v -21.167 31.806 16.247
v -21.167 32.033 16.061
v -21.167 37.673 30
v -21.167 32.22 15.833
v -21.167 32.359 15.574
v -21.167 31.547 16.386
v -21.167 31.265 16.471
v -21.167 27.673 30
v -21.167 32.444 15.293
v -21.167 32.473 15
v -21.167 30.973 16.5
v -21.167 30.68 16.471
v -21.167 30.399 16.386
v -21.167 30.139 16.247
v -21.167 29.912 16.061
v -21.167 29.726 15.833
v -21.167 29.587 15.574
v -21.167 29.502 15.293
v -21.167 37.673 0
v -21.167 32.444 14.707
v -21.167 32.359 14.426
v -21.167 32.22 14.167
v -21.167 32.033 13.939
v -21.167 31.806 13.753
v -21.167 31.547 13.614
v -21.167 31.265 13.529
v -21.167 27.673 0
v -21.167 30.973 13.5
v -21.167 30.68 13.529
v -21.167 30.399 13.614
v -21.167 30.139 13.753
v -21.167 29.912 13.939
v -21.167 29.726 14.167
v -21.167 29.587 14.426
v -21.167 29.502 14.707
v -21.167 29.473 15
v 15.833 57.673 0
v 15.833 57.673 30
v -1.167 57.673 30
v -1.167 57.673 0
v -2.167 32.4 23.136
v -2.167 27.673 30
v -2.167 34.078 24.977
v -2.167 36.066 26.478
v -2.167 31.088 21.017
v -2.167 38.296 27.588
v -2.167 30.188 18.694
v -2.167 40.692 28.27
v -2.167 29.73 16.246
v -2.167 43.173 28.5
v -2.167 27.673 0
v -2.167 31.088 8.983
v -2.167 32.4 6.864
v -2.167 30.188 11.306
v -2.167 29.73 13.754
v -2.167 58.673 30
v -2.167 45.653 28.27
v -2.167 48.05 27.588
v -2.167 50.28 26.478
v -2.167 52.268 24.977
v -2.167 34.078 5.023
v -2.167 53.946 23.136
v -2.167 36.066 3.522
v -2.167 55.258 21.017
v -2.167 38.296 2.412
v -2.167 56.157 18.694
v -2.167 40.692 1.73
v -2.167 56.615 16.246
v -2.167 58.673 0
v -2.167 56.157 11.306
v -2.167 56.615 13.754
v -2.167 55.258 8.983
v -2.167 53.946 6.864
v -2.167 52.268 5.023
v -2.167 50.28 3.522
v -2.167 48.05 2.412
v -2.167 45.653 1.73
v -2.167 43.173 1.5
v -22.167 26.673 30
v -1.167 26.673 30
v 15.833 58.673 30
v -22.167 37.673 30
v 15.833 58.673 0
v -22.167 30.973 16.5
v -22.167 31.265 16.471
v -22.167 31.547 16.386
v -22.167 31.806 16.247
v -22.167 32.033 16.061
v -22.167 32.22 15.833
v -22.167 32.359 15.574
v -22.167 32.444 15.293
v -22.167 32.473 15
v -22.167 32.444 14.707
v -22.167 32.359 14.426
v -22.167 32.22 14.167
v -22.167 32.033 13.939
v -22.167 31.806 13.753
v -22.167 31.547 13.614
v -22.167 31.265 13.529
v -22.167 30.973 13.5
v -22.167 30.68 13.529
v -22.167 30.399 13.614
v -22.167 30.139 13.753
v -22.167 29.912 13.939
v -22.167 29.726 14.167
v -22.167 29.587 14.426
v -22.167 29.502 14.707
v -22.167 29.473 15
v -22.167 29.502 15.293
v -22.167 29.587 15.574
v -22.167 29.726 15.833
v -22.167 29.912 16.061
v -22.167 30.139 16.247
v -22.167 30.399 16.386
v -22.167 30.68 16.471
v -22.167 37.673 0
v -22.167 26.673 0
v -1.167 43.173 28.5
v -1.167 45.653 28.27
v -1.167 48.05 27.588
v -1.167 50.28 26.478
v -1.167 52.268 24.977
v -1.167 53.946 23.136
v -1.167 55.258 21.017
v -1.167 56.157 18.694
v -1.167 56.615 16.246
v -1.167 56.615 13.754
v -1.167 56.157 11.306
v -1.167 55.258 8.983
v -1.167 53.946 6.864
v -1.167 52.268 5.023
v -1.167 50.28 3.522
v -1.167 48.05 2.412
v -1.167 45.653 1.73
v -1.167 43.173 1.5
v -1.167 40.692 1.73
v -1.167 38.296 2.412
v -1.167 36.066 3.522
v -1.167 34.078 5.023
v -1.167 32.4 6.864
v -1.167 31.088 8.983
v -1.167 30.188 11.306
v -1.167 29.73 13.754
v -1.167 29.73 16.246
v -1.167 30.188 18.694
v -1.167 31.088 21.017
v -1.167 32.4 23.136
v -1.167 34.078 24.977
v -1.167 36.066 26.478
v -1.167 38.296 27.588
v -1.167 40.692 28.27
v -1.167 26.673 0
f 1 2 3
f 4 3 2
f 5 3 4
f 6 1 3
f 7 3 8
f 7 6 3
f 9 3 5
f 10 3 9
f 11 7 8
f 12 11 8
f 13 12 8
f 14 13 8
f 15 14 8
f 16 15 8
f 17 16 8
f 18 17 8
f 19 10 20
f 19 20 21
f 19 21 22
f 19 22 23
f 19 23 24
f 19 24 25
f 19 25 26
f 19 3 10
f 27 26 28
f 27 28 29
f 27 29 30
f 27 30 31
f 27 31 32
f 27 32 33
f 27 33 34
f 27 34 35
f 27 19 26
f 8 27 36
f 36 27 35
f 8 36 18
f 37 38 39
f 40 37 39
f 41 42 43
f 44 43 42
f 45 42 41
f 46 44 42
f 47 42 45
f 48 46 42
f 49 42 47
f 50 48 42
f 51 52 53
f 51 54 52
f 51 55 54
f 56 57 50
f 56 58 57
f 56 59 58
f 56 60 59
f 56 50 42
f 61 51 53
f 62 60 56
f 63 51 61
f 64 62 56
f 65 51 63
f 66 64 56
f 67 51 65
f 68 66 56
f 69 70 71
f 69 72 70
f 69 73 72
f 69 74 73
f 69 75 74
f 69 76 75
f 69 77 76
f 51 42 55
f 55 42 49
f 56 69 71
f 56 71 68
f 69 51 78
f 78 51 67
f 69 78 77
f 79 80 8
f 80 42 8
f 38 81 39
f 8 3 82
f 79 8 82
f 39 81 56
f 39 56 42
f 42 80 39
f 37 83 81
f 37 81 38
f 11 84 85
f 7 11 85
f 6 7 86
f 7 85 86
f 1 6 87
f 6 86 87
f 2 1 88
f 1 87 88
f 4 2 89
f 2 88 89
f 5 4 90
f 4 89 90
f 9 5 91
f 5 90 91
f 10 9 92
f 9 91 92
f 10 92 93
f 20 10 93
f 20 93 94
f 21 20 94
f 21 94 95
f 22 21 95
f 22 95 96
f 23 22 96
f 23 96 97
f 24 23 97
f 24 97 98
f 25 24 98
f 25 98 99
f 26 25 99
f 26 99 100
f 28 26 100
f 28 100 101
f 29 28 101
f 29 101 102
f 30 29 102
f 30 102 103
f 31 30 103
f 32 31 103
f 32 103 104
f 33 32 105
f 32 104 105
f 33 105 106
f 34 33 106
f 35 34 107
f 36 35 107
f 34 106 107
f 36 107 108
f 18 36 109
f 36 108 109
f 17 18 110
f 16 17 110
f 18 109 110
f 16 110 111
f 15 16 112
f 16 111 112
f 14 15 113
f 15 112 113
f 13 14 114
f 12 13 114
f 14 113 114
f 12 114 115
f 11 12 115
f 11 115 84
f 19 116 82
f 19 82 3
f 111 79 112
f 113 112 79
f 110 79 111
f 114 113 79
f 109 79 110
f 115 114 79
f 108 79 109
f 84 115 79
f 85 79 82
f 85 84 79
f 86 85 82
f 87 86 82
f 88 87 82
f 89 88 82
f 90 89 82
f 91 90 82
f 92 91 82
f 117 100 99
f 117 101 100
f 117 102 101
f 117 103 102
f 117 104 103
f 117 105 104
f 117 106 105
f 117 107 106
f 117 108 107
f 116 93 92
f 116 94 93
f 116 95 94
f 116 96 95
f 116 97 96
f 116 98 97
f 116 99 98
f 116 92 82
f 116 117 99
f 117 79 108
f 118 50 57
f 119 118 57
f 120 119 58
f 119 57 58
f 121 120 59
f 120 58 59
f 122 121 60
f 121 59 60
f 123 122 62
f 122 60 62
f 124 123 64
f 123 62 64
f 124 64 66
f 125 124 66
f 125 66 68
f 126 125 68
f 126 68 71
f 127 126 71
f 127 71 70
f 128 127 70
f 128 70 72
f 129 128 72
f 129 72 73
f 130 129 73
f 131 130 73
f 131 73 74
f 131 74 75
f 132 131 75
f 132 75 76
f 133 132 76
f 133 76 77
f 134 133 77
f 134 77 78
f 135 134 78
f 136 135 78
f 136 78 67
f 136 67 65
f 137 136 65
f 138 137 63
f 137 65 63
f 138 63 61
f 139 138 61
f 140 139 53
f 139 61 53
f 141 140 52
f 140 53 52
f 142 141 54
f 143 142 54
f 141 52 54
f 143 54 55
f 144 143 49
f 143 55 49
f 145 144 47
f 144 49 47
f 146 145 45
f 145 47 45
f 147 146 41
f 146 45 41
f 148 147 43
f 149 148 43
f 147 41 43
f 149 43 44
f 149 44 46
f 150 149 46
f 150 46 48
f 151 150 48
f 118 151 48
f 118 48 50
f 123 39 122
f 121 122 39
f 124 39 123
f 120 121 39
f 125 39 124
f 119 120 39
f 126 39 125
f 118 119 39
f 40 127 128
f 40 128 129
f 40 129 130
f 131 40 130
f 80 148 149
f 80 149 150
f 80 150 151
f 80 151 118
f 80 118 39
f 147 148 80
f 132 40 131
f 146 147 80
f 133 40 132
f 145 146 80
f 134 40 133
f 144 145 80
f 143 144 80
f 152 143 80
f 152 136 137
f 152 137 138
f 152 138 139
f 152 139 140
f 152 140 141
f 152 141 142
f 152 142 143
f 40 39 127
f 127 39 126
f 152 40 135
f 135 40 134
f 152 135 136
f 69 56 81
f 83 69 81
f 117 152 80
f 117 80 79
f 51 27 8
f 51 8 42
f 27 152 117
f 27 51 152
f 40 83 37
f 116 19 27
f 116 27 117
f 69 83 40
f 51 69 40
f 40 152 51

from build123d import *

# Parameters (mm, degrees)
EXTRUDE_1_DEPTH     = 30
SKETCH_4_R          = 1.5
CUT_EXTRUDE_3_DEPTH = 2
SKETCH_5_R          = 13.5
CUT_EXTRUDE_4_DEPTH = 5


with BuildPart() as part:
    # 草图1 → 凸台-拉伸1 (new body)
    with BuildSketch(Plane.XY):
        Polygon((-21.167340442, 37.672826145), (-21.167340442, 27.672826145), (-2.167340442, 27.672826145), (-2.167340442, 58.672826145), (15.832659558, 58.672826145), (15.832659558, 57.672826145), (-1.167340442, 57.672826145), (-1.167340442, 26.672826145), (-22.167340442, 26.672826145), (-22.167340442, 37.672826145), align=None)
    extrude(amount=EXTRUDE_1_DEPTH)

    # 草图4 → 切除-拉伸3 (cut)
    with BuildSketch(Plane.ZY.offset(22.167340442)):
        with Locations((15, 30.972826145)):
            Circle(SKETCH_4_R)
    extrude(amount=-CUT_EXTRUDE_3_DEPTH, mode=Mode.SUBTRACT)

    # 草图5 → 切除-拉伸4 (cut)
    with BuildSketch(Plane.ZY.offset(2.167340442)):
        with Locations((15, 43.172826145)):
            Circle(SKETCH_5_R)
    extrude(amount=-CUT_EXTRUDE_4_DEPTH, mode=Mode.SUBTRACT)


solid = part.part
